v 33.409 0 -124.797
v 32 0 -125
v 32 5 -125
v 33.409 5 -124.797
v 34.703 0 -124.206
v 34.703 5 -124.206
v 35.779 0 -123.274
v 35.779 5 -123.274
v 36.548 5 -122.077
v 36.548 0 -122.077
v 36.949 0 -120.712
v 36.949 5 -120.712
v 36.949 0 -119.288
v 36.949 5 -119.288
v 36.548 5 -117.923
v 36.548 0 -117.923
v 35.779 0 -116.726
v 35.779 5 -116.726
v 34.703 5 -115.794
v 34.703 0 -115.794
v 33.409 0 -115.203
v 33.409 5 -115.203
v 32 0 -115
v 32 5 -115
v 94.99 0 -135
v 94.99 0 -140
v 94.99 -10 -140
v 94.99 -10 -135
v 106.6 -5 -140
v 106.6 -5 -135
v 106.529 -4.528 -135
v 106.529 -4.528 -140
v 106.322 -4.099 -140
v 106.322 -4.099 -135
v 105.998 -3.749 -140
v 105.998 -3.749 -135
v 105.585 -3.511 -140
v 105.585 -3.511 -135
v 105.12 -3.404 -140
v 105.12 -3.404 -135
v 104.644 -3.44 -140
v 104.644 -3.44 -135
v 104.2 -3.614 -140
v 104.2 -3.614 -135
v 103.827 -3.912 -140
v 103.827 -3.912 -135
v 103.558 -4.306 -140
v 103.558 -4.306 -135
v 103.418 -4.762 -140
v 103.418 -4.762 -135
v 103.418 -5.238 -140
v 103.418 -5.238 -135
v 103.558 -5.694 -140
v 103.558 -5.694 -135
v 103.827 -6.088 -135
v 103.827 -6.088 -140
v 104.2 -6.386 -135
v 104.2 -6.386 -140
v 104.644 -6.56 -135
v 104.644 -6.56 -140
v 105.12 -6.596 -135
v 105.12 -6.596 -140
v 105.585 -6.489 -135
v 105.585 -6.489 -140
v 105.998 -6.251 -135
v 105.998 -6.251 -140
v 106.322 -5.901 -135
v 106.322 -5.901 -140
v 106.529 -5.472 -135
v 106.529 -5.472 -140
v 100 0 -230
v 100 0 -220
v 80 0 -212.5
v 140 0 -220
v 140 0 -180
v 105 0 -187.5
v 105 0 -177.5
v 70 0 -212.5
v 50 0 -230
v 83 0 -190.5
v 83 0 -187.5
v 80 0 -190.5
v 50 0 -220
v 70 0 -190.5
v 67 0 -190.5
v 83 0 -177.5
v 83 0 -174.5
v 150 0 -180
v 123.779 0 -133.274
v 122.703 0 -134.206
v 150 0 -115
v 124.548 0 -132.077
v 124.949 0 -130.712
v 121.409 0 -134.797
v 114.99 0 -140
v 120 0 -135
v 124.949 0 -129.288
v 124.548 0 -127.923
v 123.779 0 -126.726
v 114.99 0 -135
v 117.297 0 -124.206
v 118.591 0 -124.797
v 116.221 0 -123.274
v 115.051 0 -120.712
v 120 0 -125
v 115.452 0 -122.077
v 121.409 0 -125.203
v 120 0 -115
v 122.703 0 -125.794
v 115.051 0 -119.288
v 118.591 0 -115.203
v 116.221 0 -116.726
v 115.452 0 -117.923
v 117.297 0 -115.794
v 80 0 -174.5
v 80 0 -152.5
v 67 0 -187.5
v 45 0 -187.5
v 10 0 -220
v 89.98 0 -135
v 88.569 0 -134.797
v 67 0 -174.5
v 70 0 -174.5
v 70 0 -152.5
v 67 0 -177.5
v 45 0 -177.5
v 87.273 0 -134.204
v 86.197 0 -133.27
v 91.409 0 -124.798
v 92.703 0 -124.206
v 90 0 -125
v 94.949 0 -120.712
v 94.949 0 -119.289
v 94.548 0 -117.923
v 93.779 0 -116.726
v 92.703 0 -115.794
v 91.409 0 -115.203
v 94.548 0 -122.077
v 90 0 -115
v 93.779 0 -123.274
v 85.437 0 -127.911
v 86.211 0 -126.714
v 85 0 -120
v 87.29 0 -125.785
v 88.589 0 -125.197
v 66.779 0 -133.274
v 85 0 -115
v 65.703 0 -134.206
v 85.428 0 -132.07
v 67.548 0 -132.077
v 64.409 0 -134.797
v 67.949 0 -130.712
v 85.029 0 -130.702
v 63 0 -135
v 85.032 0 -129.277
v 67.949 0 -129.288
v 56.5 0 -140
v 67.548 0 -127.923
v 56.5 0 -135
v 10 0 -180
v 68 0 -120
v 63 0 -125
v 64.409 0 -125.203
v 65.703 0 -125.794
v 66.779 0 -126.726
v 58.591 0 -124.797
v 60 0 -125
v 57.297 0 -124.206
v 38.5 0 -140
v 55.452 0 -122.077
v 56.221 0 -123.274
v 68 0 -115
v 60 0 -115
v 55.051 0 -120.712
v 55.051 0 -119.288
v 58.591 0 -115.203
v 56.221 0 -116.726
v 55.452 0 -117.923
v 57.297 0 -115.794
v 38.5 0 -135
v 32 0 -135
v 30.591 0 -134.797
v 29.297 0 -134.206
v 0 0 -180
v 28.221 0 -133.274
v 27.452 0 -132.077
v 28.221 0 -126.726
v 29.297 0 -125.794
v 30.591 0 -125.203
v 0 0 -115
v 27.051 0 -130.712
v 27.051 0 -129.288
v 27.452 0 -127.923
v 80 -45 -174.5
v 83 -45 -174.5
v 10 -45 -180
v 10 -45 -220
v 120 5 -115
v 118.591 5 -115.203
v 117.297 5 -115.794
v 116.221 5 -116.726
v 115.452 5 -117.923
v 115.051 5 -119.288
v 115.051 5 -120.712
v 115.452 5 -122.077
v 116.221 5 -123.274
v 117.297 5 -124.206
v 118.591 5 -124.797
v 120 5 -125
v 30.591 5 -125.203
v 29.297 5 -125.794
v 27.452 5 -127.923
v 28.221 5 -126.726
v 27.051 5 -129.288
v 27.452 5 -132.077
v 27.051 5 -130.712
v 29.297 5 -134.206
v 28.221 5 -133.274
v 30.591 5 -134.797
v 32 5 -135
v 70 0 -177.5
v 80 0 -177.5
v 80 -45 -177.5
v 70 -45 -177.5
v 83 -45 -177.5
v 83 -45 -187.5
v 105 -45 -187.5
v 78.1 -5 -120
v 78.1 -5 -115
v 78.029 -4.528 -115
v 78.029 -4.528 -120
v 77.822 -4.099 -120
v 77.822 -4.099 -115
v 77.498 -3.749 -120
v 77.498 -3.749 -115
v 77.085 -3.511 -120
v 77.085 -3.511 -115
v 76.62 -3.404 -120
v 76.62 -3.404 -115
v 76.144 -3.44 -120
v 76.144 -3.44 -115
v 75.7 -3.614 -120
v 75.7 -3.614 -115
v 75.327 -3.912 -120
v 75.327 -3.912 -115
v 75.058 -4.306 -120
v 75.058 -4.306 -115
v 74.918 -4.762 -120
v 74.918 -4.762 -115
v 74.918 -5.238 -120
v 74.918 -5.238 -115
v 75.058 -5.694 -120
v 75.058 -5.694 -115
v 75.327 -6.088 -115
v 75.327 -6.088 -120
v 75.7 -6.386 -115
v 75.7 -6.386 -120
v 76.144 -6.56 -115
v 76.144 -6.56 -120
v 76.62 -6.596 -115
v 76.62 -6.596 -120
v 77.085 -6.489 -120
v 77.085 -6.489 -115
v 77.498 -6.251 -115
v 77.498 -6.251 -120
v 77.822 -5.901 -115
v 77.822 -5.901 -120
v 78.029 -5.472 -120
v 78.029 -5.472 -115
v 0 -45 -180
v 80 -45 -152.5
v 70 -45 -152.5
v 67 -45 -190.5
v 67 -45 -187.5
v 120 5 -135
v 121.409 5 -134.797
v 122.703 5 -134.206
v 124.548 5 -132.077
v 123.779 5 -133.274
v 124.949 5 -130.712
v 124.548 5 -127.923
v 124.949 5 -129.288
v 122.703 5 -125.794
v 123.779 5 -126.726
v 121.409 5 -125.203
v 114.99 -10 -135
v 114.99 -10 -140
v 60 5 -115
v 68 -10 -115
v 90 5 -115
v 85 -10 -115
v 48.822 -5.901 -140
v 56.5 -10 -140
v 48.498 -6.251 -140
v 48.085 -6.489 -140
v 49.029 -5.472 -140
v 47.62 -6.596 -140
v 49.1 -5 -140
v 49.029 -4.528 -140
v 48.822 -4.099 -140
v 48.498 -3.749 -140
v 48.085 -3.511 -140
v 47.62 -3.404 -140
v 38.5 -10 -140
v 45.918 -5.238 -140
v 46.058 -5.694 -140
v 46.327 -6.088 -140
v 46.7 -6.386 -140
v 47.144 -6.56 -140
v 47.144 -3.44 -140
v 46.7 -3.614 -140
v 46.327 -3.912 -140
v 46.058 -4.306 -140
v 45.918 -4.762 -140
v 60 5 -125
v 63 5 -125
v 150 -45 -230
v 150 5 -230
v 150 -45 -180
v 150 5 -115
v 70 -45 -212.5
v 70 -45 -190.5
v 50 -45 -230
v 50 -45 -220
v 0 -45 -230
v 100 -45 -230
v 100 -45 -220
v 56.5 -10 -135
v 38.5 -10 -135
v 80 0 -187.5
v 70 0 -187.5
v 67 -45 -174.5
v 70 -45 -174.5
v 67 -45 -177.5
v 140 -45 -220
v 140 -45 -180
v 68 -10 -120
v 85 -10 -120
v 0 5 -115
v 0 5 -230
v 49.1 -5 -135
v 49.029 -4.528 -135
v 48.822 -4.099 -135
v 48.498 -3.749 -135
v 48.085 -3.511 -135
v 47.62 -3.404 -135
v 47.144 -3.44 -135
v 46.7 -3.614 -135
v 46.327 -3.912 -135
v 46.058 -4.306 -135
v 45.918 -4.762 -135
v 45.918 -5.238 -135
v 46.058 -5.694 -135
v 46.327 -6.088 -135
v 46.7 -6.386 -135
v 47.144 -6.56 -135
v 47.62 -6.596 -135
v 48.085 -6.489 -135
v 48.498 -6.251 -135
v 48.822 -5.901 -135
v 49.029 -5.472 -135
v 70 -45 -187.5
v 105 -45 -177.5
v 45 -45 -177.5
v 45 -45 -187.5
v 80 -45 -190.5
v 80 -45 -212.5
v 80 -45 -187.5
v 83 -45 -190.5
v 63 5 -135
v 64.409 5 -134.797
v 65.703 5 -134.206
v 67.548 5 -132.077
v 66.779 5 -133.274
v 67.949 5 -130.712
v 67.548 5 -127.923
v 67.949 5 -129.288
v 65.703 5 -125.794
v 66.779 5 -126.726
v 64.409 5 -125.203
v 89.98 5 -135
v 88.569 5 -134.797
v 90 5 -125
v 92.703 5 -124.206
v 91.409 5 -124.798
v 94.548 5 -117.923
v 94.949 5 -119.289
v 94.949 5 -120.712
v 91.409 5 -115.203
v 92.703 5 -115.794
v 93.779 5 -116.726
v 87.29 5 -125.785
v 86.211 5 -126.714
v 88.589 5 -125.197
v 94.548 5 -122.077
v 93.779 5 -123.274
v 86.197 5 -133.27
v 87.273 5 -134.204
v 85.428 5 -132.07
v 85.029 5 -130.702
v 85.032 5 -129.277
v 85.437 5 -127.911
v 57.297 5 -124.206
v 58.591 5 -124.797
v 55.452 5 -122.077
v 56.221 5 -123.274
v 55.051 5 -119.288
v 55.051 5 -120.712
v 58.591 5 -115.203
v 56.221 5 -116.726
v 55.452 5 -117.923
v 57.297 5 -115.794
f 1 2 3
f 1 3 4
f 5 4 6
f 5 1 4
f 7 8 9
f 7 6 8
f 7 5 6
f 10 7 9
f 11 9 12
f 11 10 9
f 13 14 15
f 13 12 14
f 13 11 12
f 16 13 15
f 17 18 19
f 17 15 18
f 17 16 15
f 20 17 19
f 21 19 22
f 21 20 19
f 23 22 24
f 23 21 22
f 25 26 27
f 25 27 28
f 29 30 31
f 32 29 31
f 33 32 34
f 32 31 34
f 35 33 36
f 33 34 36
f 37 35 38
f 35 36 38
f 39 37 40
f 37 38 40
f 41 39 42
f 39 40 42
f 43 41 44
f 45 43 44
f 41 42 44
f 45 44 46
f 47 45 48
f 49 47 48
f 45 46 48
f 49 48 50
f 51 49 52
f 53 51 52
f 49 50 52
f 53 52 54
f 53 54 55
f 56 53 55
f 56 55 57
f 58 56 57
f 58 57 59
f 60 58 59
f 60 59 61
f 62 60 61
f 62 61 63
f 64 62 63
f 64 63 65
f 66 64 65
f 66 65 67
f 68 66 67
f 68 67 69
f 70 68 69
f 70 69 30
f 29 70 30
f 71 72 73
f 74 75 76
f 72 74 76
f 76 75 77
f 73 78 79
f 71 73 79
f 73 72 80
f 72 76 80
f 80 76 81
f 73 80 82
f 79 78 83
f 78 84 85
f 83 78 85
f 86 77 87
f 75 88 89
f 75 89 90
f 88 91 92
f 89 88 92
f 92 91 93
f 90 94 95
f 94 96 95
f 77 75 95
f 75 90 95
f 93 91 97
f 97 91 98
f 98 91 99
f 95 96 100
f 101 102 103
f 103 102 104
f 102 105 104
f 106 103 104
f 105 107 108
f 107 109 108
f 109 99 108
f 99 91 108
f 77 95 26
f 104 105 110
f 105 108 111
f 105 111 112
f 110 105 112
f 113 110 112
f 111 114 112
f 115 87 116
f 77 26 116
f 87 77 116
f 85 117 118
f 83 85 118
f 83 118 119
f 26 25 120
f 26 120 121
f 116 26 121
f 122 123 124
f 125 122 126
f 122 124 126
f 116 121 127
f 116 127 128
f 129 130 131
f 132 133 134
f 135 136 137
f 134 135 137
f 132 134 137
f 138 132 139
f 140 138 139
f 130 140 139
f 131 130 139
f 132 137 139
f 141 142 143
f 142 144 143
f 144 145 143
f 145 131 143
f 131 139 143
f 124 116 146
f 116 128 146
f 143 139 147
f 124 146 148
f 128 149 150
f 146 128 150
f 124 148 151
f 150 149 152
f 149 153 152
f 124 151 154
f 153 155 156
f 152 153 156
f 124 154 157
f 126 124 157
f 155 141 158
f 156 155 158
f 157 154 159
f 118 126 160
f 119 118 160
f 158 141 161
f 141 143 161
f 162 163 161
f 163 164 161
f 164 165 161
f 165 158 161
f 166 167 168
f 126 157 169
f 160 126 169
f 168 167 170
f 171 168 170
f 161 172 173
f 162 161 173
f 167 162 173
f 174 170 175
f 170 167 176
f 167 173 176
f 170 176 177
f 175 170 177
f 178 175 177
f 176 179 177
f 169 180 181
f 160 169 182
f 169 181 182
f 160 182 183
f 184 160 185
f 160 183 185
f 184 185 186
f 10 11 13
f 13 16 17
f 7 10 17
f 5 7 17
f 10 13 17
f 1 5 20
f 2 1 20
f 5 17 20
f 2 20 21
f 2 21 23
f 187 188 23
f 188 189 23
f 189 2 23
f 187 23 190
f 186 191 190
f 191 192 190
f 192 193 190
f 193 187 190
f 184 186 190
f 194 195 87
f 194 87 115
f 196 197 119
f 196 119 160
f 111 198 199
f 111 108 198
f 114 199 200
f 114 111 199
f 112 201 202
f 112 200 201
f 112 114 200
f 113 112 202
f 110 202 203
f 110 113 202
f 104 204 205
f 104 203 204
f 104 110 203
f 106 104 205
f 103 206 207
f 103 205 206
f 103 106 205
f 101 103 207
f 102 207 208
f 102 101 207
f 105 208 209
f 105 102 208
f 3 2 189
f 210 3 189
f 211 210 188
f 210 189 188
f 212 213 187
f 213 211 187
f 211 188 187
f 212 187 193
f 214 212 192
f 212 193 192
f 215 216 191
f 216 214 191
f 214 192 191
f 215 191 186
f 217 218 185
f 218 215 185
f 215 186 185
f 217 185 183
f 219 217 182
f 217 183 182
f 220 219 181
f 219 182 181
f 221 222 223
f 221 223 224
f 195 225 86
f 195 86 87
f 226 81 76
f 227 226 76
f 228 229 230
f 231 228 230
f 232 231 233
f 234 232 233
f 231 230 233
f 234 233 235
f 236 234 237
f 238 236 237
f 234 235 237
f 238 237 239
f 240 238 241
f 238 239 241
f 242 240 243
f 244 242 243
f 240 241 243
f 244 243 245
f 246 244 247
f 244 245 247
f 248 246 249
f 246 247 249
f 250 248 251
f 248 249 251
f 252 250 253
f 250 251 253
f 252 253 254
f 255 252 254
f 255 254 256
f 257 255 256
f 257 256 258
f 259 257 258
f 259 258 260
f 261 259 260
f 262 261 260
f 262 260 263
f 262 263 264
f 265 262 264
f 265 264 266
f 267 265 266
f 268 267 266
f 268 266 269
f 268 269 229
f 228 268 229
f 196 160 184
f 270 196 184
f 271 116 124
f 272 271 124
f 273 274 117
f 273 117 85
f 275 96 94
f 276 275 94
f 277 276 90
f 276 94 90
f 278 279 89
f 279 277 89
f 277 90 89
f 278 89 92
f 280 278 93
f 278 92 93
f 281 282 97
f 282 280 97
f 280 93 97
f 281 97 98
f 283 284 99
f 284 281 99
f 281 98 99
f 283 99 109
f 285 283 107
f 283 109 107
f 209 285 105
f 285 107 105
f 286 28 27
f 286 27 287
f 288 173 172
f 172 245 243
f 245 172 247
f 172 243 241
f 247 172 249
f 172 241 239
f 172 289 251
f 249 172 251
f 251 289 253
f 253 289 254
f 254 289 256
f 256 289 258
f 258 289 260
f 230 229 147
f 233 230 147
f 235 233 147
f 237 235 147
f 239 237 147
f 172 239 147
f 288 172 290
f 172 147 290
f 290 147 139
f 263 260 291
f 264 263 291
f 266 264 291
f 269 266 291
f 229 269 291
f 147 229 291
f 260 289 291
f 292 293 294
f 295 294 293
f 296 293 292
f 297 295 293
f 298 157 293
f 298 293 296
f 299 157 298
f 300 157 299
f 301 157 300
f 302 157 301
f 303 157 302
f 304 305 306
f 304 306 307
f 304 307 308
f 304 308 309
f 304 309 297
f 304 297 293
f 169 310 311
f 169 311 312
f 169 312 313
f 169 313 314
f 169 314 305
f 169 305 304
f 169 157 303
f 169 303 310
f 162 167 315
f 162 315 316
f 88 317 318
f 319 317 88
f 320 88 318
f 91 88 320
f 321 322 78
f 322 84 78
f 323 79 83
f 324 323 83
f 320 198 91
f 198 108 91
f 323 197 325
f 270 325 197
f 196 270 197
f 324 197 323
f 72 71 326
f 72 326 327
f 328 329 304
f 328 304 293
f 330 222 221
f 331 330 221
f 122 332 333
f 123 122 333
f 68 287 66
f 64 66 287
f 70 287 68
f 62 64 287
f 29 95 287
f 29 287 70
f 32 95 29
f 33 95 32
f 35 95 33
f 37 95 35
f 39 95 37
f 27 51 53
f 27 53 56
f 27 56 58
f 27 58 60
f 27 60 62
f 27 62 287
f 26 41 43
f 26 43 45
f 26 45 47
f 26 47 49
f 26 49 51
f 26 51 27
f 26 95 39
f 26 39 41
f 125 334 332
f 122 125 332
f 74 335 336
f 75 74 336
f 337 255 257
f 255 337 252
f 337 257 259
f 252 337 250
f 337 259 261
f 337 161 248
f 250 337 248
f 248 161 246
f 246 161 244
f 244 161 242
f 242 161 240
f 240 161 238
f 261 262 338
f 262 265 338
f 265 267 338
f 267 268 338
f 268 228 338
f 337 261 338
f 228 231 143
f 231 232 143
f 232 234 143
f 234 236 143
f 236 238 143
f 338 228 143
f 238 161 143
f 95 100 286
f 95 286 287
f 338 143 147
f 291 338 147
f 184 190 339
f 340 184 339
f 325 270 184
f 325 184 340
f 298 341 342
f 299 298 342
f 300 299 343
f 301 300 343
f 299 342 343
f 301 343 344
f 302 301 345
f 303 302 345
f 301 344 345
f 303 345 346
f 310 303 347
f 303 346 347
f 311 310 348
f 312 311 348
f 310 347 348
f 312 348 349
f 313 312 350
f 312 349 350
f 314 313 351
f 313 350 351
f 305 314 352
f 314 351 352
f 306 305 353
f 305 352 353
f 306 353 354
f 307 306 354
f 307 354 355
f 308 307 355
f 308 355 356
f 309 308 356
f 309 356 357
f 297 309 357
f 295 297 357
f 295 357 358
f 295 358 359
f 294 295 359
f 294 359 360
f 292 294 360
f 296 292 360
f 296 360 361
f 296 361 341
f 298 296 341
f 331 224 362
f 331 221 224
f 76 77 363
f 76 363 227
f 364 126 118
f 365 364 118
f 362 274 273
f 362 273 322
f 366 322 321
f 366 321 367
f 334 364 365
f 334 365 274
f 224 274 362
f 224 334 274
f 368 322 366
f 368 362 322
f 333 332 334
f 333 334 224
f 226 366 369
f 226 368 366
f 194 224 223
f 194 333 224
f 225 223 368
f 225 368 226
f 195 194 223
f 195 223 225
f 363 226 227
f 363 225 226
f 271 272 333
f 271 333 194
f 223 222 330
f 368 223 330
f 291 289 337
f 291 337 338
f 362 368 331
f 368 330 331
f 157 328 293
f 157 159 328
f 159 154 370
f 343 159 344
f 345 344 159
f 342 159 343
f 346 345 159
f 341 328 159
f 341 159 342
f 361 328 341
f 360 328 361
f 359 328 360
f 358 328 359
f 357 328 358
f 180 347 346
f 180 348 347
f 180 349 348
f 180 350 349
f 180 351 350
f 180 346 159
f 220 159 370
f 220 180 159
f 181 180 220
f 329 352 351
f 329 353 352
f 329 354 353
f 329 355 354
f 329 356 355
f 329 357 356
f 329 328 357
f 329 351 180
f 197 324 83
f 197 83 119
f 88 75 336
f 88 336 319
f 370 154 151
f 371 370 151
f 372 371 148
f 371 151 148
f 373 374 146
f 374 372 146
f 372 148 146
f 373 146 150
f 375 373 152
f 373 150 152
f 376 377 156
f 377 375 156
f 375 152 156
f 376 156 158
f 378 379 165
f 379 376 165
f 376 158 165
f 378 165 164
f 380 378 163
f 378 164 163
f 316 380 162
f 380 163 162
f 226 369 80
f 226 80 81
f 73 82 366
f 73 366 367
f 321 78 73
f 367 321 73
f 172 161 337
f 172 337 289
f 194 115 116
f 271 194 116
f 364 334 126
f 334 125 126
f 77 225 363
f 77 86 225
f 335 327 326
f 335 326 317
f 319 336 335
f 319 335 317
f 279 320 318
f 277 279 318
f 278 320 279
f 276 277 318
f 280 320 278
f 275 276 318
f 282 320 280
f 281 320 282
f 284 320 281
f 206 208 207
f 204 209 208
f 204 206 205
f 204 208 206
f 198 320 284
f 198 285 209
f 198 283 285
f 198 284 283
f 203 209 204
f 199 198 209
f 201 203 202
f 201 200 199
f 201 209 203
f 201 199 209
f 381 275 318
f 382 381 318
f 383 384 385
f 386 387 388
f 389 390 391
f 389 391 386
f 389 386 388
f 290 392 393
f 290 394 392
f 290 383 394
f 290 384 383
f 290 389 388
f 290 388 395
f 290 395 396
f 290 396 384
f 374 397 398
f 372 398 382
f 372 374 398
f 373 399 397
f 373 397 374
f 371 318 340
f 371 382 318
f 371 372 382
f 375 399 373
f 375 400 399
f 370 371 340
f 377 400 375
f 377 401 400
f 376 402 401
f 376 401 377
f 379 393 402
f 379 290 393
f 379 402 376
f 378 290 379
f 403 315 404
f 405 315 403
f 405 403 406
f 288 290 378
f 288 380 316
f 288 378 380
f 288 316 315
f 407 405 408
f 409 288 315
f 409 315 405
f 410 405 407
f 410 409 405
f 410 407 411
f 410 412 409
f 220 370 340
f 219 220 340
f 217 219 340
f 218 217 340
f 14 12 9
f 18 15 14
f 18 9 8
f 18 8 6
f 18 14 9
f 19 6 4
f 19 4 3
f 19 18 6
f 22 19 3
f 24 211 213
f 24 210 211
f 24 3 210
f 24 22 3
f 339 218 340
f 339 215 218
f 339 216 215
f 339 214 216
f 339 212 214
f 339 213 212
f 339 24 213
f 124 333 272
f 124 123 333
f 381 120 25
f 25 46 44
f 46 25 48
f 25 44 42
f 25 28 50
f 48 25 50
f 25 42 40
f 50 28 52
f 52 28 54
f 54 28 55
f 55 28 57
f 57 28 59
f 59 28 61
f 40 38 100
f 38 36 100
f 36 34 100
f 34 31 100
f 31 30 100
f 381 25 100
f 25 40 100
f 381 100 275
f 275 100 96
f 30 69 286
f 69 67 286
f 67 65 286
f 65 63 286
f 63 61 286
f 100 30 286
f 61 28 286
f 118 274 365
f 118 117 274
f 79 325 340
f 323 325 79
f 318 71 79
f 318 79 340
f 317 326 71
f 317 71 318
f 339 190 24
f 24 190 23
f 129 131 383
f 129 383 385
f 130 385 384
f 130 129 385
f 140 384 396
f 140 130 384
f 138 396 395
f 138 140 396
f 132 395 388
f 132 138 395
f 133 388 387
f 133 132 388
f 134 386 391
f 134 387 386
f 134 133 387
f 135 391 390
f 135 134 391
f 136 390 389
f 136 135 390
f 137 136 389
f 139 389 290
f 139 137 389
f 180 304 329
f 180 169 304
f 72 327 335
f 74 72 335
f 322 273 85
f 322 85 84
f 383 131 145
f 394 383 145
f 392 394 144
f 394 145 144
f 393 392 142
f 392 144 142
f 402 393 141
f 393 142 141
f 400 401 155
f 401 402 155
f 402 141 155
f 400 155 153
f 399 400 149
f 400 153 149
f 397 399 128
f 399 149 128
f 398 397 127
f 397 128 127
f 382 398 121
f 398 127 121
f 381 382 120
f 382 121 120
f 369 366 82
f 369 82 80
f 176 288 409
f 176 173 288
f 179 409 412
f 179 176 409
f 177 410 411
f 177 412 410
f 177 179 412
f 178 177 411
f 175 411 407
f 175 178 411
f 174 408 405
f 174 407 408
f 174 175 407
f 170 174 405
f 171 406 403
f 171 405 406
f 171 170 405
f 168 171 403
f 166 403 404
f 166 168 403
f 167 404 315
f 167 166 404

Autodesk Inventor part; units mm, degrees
ref_plane "YZ Plane" through (0, 0, 0) normal (1, 0, 0) x (0, 1, 0)
ref_plane "XZ Plane" through (0, 0, 0) normal (0, 1, 0) x (-1, 0, 0)
ref_plane "XY Plane" through (0, 0, 0) normal (0, 0, 1) x (1, 0, 0)
sketch "puzzle" plane through (0, 0, 0) normal (0, 1, 0) x (-1, 0, 0)
  line L0 (0, -115) -> (-15, -115)
  line L1 (-135, -115) -> (-125, -115)
  line L2 (-135, -115) -> (-150, -115)
  line L3 (-75, -115) -> (-65, -115)
  line L4 (-75, -115) -> (-85.0002, -115)
  line L5 (-105, -135) -> (-94.9796, -135)
  line L6 (-94.9796, -135) -> (-115, -135)
  line L7 (-65, -115) -> (-60, -115)
  line L8 (-60, -125) -> (-63, -125)
  arc A0 (-60, -125) -> (-60, -115) centre (-60, -120) ccw
  arc A1 (-63, -125) -> (-63, -135) centre (-63, -130) ccw
  line L9 (-85.0002, -115) -> (-90.0002, -115)
  line L10 (-94.9796, -135) -> (-89.9796, -135)
  arc A2 (-90.0002, -115) -> (-90, -125) centre (-90.0002, -120) ccw
  arc A3 (-89.9796, -135) -> (-90, -125) centre (-89.9796, -130) ccw
  line L11 (-115, -135) -> (-120, -135)
  line L12 (-125, -115) -> (-120, -115)
  arc A4 (-120, -125) -> (-120, -115) centre (-120, -120) ccw
  arc A5 (-120, -125) -> (-120, -135) centre (-120, -130) ccw
  line L13 (0, -115) -> (-30, -115)
  line L14 (-63, -135) -> (-32.98, -135)
  line L15 (-32.98, -135) -> (-32, -135)
  line L16 (-30, -115) -> (-32, -115)
  arc A6 (-32, -115) -> (-32, -125) centre (-32, -120) ccw
  arc A7 (-32, -135) -> (-32, -125) centre (-32, -130) ccw
  line L17 (0, -115) -> (0, -230)
  line L18 (0, -230) -> (-150, -230)
  line L19 (-150, -230) -> (-150, -115)
  point P0 (0, 0)
  dimension "d22" = 5
  dimension "d23" = 5
  dimension "d24" = 5
  dimension "d25" = 5
  dimension "d26" = 5
  dimension "d76" = 115
extrude "Extrusión4" add sketch "puzzle" along normal blind 5
sketch "Boceto4" plane through (0, 0, 0) normal (0, -1, 0) x (1, 0, 0)
  line L0 (0, -115) -> (0, -230) projected
  line L1 (32, -115) -> (0, -115) projected
  line L2 (0, -230) -> (10, -230)
  line L3 (150, -230) -> (0, -230) projected
  line L4 (10, -180) -> (0, -180)
  line L5 (0, -230) -> (0, -180)
  line L6 (10, -230) -> (50, -230)
  line L7 (50, -230) -> (50, -220)
  line L8 (50, -220) -> (10, -220)
  line L9 (10, -220) -> (10, -180)
  line L10 (150, -230) -> (100, -230)
  line L11 (100, -230) -> (100, -220)
  line L12 (100, -220) -> (140, -220)
  line L13 (140, -220) -> (140, -180)
  line L14 (140, -180) -> (150, -180)
  line L15 (150, -115) -> (150, -230) projected
  line L16 (150, -230) -> (150, -180)
  line L17 (70, -212.5) -> (80, -212.5)
  line L18 (80, -152.5) -> (70, -152.5)
  line L19 (45, -177.5) -> (45, -187.5)
  line L20 (105, -177.5) -> (105, -187.5)
  line L21 (83, -177.5) -> (83, -174.5)
  line L22 (83, -174.5) -> (80, -174.5)
  line L23 (80, -174.5) -> (80, -152.5)
  line L24 (83, -177.5) -> (105, -177.5)
  line L25 (80, -177.5) -> (80, -187.5)
  line L26 (80, -177.5) -> (70, -177.5)
  line L27 (67, -177.5) -> (67, -174.5)
  line L28 (67, -174.5) -> (70, -174.5)
  line L29 (67, -187.5) -> (67, -190.5)
  line L30 (67, -190.5) -> (70, -190.5)
  line L31 (67, -177.5) -> (45, -177.5)
  line L32 (67, -187.5) -> (45, -187.5)
  line L33 (70, -174.5) -> (70, -152.5)
  line L34 (70, -177.5) -> (70, -182.5)
  line L35 (70, -190.5) -> (70, -212.5)
  line L36 (80, -187.5) -> (70, -187.5)
  line L37 (70, -187.5) -> (70, -182.5)
  line L38 (80, -190.5) -> (83, -190.5)
  line L39 (83, -190.5) -> (83, -187.5)
  line L40 (80, -190.5) -> (80, -212.5)
  line L41 (83, -187.5) -> (105, -187.5)
  point P0 (0, 0)
extrude "Extrusión5" add sketch "Boceto4" along normal blind 45
sketch "Boceto5" plane through (0, 0, 0) normal (0, -1, 0) x (1, 0, 0)
  line L0 (85, -115) -> (68, -115)
  line L1 (68, -120) -> (85, -120)
  line L2 (68, -120) -> (68, -115)
  line L3 (85, -120) -> (85, -115)
  line L4 (32, -135) -> (63, -135) projected
  line L5 (47.5, -135) -> (38.5, -135)
  line L6 (38.5, -135) -> (56.5, -135)
  line L7 (56.5, -135) -> (56.5, -140)
  line L8 (56.5, -140) -> (38.5, -140)
  line L9 (38.5, -140) -> (38.5, -135)
  line L10 (120, -135) -> (89.9796, -135) projected
  line L11 (104.9898, -135) -> (94.9898, -135)
  line L12 (94.9898, -135) -> (104.9898, -135)
  line L13 (104.9898, -135) -> (114.9898, -135)
  line L14 (114.9898, -135) -> (114.9898, -140)
  line L15 (114.9898, -140) -> (94.9898, -140)
  line L16 (94.9898, -140) -> (94.9898, -135)
  point P0 (0, 0)
extrude "Extrusión6" add sketch "Boceto5" along normal blind 10
sketch "Boceto6" plane through (89.9796, 5, -135) normal (0, 0, 1) x (1, 0, 0)
  line L0 (10.0204, -5) -> (50.0204, -5) projected
  line L1 (25, -5) -> (15, -5)
  line L2 (25.0102, -5) -> (25.0102, -15) projected
  line L3 (25.0102, -5) -> (25.0102, -15)
  line L4 (25.0102, -15) -> (5.0102, -15) projected
  line L5 (25.0102, -15) -> (5.0102, -15)
  line L6 (15.0204, -5) -> (15.0204, -50) projected
  circle A0 centre (15.0204, -10) radius 1.6
  line L7 (-33.4796, -15) -> (-51.4796, -15) projected
  line L8 (-33.4796, -15) -> (-51.4796, -15)
  circle A1 centre (-42.4796, -10) radius 1.6
  point P0 (-89.9796, -5)
  dimension "d120" = 10
  dimension "d121" = 3.2
  dimension "d123" = 3.2
extrude "Extrusión7" cut sketch "Boceto6" against normal blind 10 contours A0 L6 | L6 A0 | A1
sketch "Boceto7" plane through (32, 5, -135) normal (0, 0, 1) x (1, 0, 0)
  circle A0 centre (15.5, -10) radius 1.6 projected
  circle A1 centre (15.5, -10) radius 1.6
  point P0 (-32, -5)
extrude "Extrusión8" cut sketch "Boceto7" against normal blind 34
sketch "Boceto8" plane through (68, 0, -115) normal (0, 0, 1) x (1, 0, 0)
  line L0 (22.0002, 0) -> (-8, 0) projected
  line L1 (17, 0) -> (0, 0)
  line L2 (0, 0) -> (0, -10)
  line L3 (0, -10) -> (17, -10)
  line L4 (17, -10) -> (17, 0)
  circle A0 centre (8.5, -5) radius 1.6
  point P0 (-68, 0)
  dimension "d128" = 3.2
extrude "Extrusión9" cut sketch "Boceto8" against normal blind 5 contours A0
properties part number "base auxiliar 2"
